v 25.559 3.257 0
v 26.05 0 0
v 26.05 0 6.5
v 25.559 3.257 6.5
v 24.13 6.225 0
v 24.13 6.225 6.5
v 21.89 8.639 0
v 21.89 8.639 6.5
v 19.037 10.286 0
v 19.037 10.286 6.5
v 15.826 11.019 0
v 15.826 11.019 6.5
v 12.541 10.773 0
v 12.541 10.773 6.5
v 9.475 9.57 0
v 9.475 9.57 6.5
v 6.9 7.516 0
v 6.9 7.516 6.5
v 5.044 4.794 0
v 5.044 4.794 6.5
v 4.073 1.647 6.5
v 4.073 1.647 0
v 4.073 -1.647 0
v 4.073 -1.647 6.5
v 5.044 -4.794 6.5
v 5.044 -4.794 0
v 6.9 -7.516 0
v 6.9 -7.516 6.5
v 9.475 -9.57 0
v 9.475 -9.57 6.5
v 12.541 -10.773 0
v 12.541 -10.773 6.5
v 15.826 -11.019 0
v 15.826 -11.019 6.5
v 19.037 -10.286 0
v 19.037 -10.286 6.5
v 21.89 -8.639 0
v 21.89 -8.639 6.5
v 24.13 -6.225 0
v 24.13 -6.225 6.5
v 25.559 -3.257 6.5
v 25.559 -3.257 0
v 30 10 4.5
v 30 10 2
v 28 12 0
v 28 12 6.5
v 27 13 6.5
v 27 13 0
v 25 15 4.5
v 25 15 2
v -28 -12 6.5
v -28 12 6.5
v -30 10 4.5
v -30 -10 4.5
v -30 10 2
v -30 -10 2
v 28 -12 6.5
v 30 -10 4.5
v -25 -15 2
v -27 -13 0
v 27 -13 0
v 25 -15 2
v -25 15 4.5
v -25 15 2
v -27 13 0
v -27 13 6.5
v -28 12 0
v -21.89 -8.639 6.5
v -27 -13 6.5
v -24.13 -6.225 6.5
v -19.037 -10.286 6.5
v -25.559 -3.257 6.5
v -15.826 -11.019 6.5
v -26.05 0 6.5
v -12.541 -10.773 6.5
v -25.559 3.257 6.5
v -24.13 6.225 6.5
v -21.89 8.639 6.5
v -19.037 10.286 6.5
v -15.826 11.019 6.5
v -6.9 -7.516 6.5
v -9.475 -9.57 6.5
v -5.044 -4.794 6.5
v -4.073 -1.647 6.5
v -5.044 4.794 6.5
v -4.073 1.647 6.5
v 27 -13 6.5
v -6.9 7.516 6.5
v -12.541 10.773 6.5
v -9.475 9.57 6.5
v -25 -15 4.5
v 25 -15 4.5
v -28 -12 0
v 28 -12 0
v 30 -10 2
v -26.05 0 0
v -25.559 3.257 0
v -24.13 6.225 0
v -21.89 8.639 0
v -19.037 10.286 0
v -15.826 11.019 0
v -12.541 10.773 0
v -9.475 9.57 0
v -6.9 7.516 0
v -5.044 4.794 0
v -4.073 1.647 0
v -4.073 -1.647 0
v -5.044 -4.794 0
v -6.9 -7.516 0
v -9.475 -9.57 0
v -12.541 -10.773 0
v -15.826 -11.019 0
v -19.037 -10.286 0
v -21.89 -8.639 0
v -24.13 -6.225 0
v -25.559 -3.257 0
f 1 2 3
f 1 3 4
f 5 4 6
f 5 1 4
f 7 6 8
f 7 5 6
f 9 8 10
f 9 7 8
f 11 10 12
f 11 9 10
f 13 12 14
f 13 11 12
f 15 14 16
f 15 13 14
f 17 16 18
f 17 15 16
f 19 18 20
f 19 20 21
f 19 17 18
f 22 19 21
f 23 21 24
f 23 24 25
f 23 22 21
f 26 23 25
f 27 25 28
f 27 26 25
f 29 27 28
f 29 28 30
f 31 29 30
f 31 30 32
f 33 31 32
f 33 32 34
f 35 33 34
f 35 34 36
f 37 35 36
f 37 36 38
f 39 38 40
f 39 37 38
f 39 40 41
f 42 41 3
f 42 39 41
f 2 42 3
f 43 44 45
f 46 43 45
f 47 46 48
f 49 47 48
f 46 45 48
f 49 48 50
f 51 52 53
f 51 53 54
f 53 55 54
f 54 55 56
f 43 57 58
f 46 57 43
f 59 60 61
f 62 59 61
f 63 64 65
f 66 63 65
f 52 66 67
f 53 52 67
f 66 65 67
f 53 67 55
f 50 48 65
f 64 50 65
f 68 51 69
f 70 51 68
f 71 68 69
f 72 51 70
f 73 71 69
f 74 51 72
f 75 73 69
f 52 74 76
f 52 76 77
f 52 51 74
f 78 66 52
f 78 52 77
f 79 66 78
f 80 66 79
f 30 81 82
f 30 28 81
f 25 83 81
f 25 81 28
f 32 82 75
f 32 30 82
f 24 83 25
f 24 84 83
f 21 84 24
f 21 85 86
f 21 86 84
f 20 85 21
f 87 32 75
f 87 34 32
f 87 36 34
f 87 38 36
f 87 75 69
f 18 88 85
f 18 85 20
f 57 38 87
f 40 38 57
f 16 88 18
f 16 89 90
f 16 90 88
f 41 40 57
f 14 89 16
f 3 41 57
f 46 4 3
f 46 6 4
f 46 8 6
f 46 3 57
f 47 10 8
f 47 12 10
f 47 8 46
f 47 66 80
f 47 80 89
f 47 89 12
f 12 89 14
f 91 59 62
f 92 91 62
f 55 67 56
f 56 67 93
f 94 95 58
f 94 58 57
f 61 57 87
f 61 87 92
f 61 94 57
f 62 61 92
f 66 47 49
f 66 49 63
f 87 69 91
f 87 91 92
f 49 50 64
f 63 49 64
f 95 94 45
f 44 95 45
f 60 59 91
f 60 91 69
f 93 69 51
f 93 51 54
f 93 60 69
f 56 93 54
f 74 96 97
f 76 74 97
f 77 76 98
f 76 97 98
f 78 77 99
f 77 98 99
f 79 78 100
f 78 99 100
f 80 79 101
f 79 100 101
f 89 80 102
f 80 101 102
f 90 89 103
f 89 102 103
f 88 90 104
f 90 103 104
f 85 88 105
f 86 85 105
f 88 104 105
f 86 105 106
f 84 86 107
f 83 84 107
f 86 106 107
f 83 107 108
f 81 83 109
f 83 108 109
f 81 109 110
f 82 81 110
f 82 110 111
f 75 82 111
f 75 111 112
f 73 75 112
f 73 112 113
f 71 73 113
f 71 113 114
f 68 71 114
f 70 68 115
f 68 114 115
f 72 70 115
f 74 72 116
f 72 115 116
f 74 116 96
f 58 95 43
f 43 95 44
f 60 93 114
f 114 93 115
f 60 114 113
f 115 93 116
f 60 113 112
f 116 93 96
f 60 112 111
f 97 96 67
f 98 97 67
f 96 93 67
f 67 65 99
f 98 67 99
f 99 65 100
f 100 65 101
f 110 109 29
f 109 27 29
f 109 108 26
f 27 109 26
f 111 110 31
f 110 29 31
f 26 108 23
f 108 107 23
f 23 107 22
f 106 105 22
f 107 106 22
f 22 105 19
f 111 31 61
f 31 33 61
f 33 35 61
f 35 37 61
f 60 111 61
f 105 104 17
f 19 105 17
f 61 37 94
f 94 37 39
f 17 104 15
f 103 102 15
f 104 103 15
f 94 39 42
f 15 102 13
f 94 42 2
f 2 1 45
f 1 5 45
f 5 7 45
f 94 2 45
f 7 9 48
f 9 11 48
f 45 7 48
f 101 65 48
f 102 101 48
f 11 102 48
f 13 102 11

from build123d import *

# Parameters (mm, degrees)
F0_R        = 11.05
F1_DEPTH    = 6.5
F2_SIZE     = 2
F3_T1_DEPTH = 28.2168298797


# Not quite as in the source:
# - a fillet or chamfer that OpenCascade refuses, or shapes differently, is made with other operations: its cross-section is extruded or revolved along the edge and cut away or added


with BuildPart() as f1:
    # F0 (on Top) → F1 (new body)
    with BuildSketch(Plane.XY):
        Polygon((30, 0), (30, 15), (-30, 15), (-30, 0), (-30, -15), (30, -15), align=None)
        with BuildLine():
            ThreePointArc((-3.95, 0), (-15, -11.05), (-26.05, 0))
            ThreePointArc((-26.05, 0), (-15, 11.05), (-3.95, 0))
        make_face(mode=Mode.SUBTRACT)
        with Locations((15, 0)):
            Circle(F0_R, mode=Mode.SUBTRACT)
    extrude(amount=F1_DEPTH)

    # F2
    f2_edges = [f1.edges().sort_by_distance(p)[0] for p in [
        (-30, 0, 6.5),
        (-30, 0, 0),
        (0, -15, 0),
        (0, -15, 6.5),
        (0, 15, 0),
        (0, 15, 6.5),
        (30, 0, 0),
        (30, 0, 6.5),
    ]]
    chamfer(f2_edges, length=F2_SIZE)

    # F3: chamfer of 5 on 4 edges, made by hand

    # F3_s2 → F3_t1 (cut)
    with BuildSketch(Plane.XY.offset(-10.8584149398)):
        Polygon((30, 10), (25, 15), (30, 15), align=None)
        Polygon((30, -10), (25, -15), (30, -15), align=None)
        Polygon((-25, 15), (-30, 10), (-30, 15), align=None)
        Polygon((-25, -15), (-30, -10), (-30, -15), align=None)
    extrude(amount=F3_T1_DEPTH, mode=Mode.SUBTRACT)


solid = f1.part
